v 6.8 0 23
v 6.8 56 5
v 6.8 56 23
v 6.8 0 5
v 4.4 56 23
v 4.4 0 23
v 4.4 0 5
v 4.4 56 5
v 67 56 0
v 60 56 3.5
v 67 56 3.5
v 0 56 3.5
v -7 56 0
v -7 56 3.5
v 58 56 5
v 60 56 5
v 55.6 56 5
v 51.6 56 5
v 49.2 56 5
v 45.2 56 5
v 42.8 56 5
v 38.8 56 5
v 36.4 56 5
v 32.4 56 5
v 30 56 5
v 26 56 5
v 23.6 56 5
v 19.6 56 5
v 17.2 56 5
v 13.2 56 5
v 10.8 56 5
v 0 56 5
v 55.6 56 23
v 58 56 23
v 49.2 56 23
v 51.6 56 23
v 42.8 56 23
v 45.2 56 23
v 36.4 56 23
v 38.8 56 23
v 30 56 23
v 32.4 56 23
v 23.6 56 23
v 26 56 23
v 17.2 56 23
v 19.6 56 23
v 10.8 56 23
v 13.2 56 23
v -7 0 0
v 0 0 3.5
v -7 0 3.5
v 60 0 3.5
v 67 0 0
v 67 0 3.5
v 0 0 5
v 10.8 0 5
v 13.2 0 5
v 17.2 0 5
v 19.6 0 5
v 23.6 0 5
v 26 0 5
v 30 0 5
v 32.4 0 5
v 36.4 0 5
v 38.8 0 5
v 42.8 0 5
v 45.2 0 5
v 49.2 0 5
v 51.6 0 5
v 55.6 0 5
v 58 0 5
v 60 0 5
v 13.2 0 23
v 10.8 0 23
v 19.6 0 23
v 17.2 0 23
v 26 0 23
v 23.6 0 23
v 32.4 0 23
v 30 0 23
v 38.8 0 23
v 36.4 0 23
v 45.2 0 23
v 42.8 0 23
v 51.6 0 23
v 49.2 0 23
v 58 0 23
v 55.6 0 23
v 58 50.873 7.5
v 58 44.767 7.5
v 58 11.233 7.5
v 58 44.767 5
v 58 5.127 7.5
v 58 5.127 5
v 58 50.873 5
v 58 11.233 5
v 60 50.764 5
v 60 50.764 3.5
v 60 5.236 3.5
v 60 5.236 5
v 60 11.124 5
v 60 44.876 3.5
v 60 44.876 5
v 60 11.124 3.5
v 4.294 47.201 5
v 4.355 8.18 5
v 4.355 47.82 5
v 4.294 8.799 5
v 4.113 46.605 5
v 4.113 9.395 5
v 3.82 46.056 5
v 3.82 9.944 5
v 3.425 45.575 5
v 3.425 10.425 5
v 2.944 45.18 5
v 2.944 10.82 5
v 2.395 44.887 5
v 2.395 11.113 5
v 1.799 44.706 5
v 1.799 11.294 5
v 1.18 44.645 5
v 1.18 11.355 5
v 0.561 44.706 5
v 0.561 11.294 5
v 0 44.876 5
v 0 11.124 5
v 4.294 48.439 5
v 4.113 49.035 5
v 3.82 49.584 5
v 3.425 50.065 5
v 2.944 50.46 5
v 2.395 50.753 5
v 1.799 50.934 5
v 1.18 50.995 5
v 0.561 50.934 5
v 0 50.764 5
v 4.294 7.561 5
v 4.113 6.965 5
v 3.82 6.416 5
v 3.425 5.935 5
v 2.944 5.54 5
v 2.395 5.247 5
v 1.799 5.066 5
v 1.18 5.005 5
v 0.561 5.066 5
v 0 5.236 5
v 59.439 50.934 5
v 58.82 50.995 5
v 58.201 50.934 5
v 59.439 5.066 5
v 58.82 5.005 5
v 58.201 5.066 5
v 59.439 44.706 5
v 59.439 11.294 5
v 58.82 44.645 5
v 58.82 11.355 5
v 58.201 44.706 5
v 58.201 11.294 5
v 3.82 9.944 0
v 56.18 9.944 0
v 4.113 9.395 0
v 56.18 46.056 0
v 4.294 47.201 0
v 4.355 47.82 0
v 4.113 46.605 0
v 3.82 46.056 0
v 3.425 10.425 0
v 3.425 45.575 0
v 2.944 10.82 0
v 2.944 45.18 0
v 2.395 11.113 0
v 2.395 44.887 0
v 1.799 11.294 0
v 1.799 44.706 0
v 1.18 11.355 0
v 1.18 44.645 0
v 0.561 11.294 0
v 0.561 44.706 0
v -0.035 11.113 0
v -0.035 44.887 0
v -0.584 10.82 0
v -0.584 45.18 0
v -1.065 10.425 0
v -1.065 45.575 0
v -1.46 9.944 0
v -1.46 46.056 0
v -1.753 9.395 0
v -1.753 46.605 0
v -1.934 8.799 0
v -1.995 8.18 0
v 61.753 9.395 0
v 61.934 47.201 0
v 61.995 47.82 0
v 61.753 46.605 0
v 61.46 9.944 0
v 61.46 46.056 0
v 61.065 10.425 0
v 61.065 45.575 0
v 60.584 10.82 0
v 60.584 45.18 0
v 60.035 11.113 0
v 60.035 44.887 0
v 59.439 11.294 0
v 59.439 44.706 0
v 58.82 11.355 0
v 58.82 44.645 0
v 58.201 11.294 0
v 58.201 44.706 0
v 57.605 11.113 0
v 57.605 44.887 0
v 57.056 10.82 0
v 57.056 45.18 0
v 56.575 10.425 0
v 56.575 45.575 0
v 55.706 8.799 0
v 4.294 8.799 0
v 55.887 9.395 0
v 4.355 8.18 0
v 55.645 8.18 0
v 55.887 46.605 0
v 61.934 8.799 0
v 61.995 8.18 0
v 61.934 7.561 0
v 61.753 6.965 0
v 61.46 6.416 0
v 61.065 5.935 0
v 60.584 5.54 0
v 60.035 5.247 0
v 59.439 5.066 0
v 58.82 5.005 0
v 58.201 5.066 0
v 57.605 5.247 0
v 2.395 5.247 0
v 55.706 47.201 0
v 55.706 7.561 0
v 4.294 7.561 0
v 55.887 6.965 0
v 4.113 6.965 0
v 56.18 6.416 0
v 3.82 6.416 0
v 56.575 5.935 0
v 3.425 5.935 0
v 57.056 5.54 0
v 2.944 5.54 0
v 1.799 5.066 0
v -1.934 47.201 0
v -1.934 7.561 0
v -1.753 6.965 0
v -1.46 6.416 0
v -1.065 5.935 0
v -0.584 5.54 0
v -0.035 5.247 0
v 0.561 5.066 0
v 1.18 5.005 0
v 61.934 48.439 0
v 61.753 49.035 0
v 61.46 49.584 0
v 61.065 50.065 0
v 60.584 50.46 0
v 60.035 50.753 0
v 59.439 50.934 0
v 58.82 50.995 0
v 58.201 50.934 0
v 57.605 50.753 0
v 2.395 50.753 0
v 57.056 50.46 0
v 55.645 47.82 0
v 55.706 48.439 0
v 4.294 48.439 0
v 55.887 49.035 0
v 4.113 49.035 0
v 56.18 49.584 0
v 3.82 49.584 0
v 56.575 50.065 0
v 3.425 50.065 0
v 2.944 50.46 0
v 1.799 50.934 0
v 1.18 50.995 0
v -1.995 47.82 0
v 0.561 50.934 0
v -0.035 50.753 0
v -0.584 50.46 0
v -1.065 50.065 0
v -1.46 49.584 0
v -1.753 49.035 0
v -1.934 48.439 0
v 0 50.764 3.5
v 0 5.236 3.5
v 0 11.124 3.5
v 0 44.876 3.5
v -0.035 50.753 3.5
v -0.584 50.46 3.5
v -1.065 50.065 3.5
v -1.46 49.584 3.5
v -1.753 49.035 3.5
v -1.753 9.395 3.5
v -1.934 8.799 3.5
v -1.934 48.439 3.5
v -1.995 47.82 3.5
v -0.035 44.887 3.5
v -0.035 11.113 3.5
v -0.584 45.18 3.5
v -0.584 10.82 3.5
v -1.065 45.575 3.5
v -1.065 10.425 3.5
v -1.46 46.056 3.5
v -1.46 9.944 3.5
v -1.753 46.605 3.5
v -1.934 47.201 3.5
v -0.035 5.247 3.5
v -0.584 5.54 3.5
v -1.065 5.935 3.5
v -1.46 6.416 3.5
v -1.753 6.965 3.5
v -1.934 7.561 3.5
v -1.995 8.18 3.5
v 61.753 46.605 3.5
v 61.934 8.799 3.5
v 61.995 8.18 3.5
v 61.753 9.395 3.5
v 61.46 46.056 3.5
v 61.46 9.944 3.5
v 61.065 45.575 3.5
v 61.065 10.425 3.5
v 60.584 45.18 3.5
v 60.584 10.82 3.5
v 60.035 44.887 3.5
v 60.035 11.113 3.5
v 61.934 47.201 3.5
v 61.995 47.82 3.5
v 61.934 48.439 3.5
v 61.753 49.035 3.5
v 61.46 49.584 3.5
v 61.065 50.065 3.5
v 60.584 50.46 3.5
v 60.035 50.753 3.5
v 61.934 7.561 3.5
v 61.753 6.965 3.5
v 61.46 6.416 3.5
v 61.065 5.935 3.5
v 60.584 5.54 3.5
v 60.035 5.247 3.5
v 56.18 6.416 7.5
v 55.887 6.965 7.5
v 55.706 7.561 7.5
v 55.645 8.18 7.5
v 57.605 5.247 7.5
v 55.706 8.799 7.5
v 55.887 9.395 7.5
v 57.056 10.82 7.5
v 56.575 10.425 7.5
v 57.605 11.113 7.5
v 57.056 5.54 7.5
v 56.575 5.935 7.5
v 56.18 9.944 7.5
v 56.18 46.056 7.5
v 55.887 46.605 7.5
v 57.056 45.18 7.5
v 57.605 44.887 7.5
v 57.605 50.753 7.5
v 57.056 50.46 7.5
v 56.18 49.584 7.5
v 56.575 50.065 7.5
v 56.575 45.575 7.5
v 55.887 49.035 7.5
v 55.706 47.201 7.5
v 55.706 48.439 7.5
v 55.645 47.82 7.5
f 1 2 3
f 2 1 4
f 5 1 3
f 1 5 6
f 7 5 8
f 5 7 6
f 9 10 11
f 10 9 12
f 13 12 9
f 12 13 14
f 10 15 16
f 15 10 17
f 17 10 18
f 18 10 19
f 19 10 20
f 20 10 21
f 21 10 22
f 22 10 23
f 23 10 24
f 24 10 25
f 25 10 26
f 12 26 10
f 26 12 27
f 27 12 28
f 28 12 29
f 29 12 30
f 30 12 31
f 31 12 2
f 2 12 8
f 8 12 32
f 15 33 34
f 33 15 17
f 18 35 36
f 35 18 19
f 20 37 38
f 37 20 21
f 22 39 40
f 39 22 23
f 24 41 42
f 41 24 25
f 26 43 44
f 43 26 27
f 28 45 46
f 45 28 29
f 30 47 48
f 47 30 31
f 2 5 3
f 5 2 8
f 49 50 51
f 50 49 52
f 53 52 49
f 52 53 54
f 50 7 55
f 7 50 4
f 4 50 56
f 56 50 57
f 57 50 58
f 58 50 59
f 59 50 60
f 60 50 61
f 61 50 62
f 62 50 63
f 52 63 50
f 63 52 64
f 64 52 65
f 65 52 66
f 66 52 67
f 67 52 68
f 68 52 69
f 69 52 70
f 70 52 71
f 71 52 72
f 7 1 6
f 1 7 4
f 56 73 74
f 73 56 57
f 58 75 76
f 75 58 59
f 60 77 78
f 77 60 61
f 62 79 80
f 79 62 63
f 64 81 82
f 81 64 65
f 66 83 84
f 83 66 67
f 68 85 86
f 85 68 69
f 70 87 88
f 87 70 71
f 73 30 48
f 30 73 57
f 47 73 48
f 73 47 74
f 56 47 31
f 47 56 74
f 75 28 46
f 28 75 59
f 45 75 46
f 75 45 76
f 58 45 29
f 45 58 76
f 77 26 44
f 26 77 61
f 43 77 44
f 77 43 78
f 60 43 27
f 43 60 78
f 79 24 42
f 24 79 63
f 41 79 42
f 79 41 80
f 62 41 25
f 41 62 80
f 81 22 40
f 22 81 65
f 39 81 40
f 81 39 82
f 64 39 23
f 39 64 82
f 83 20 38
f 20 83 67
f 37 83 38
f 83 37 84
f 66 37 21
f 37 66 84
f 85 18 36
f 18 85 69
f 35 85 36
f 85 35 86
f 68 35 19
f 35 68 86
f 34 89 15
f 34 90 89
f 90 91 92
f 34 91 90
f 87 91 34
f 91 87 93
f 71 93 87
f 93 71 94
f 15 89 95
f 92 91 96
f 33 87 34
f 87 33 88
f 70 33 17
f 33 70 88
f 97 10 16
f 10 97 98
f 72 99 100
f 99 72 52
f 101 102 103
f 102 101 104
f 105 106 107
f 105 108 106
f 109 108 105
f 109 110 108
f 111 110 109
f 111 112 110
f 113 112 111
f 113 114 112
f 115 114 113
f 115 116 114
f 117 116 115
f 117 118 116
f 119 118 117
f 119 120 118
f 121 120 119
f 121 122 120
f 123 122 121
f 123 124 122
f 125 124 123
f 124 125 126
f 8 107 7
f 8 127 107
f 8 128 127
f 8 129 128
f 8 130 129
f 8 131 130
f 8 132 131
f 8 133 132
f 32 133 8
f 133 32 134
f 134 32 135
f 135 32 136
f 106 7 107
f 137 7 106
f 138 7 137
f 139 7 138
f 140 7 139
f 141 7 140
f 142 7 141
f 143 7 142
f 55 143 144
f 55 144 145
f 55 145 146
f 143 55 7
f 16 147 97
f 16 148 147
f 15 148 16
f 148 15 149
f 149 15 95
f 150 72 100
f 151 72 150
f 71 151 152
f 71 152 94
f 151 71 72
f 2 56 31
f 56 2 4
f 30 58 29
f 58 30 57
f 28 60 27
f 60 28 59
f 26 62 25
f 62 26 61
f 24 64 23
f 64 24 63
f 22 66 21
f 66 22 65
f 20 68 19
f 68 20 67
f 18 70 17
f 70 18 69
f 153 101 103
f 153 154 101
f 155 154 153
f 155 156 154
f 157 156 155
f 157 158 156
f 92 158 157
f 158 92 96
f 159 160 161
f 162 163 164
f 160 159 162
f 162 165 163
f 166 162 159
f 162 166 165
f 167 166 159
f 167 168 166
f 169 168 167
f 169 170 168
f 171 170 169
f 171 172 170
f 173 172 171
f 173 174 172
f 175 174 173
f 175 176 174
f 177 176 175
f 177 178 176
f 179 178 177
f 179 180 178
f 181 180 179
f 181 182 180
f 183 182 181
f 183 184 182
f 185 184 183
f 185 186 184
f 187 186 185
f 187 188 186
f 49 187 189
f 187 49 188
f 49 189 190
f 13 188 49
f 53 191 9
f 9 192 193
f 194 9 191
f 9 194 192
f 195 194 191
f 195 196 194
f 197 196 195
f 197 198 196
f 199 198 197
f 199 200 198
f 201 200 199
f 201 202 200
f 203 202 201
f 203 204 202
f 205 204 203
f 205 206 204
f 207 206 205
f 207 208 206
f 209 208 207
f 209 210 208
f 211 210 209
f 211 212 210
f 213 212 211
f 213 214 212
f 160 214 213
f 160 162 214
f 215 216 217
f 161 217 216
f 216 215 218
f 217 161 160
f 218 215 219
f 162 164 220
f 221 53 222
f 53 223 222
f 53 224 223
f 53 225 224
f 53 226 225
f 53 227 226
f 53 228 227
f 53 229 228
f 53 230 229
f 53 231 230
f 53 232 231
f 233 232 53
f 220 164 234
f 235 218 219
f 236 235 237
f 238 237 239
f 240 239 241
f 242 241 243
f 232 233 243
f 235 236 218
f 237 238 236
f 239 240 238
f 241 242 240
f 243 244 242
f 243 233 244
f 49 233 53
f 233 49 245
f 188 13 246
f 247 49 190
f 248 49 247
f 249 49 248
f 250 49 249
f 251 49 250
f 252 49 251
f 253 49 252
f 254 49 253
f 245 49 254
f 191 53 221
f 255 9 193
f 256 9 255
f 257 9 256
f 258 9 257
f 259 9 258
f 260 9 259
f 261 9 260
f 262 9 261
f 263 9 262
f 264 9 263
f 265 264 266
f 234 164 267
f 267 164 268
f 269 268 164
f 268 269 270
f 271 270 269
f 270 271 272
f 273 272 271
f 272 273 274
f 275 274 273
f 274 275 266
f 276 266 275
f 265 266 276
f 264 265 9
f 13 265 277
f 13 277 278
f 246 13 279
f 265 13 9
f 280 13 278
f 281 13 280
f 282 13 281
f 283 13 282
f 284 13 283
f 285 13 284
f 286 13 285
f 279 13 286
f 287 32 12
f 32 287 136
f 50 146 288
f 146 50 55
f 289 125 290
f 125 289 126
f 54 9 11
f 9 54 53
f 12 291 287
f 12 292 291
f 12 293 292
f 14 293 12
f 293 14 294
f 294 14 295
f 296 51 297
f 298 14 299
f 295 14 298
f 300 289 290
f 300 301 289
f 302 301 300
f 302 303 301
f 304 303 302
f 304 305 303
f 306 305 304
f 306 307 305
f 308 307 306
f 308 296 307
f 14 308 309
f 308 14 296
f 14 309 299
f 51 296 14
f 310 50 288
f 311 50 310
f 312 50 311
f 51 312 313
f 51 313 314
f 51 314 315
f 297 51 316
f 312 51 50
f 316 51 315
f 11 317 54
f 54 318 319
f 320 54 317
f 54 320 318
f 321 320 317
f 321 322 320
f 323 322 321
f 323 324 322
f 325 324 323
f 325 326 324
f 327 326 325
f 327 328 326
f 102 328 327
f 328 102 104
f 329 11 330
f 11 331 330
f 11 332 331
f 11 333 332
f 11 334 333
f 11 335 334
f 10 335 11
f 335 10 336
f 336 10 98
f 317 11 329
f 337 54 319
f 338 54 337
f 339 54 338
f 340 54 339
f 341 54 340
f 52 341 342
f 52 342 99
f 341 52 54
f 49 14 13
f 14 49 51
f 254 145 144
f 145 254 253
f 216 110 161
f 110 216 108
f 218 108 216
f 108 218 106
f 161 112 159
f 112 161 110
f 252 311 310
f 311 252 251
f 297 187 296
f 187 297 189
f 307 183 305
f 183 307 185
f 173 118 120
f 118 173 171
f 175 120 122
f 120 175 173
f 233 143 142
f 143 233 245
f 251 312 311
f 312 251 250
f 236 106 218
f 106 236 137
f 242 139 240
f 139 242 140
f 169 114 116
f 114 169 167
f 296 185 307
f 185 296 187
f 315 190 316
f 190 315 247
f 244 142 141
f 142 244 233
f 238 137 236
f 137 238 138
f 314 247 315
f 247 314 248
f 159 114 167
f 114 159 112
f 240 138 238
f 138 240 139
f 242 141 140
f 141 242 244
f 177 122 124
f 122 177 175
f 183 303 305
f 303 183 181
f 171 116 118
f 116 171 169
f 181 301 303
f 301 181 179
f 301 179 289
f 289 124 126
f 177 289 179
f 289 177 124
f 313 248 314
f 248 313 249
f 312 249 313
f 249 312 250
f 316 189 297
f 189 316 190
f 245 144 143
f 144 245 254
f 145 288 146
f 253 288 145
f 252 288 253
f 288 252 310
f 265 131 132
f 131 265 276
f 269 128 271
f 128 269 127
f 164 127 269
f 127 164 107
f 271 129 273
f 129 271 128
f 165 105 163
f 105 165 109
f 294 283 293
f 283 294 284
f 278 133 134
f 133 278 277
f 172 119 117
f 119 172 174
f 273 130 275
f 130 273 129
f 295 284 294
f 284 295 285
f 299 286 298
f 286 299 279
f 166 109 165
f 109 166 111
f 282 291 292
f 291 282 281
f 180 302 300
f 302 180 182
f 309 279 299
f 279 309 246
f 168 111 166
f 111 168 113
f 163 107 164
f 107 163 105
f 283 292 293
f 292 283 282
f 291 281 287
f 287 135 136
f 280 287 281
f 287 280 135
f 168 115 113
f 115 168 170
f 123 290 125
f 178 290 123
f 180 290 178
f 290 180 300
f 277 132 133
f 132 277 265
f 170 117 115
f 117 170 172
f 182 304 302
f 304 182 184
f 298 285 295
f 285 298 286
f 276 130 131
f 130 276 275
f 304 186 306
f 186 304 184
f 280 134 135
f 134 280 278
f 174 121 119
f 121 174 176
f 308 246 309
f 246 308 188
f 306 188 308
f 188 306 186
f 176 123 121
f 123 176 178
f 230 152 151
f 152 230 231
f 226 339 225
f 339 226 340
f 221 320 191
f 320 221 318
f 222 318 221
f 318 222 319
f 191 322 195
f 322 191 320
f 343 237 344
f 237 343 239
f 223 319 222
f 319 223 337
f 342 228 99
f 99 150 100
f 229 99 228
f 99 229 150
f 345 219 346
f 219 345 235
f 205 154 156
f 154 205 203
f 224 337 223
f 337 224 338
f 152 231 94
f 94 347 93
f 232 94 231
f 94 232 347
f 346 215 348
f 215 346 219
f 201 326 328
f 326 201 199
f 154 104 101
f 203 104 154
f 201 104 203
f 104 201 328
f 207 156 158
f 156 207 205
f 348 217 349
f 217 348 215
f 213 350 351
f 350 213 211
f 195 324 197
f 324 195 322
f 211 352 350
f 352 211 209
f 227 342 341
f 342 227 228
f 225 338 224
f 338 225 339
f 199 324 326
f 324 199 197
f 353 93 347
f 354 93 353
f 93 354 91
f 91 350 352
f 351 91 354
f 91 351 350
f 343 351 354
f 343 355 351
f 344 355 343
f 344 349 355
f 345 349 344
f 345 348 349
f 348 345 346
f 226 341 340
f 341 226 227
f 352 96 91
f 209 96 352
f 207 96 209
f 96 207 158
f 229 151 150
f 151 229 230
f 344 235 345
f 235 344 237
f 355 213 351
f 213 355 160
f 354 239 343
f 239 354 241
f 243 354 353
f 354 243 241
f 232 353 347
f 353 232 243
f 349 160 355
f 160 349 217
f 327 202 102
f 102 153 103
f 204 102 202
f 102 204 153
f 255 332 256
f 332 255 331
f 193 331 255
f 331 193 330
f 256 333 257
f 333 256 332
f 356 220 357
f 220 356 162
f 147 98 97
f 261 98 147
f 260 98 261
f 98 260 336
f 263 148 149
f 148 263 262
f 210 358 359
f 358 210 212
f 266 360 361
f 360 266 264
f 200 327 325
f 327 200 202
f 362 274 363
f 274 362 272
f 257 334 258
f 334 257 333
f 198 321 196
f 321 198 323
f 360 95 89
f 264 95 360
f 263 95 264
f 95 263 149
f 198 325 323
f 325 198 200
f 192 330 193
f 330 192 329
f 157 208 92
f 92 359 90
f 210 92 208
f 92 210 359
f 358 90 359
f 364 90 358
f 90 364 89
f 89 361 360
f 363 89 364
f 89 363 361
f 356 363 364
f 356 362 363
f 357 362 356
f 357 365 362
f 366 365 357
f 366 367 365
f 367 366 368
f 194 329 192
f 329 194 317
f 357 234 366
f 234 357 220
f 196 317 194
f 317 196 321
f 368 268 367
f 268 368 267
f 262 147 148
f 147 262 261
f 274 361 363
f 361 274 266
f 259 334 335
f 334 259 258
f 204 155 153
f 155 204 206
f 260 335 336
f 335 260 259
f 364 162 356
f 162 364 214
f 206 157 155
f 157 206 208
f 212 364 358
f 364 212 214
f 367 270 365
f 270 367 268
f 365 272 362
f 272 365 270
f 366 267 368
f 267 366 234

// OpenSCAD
$fn = 32;

// ----------------------------------------------------------------------
// Finned heat sink: 60 x 56 mm base, 18 mm fins
// ----------------------------------------------------------------------

// --- parameters (mm) ---
base_w = 60;              // base width
base_d = 56;              // base depth
base_t = 5;               // base thickness
fin_h = 18;               // fin height above the base
holes_d = 6.35;           // fixing holes
hole_x = 28.82;           // hole offset in x
hole_y = 19.82;           // hole offset in y
fin_t = 2.4;              // fin thickness
fin_pitch = 6.4;          // fin pitch
fin_count = 9;            // number of fins
fin_x0 = 4.4;             // first fin offset
flange_w = 74;            // flange plate width
flange_t = 3;             // flange plate thickness

difference() {
  union() {
    cube([base_w, base_d, base_t]);
    for (i = [0 : fin_count - 1]) {
      translate([fin_x0 + i * fin_pitch, 0, base_t - 0.5]) cube([fin_t, base_d, fin_h + 0.5]);
    }
    /* mounting flange, a wider plate sharing the base bottom */
    translate([(base_w - flange_w) / 2, 0, 0]) cube([flange_w, base_d, flange_t + 0.5]);
  }
  /* fixing holes through the base, 2.5 mm clear on both sides */
  for (hx = [-28.82, 28.82]) {
    for (hy = [-19.82, 19.82]) {
      translate([base_w / 2 + hx, base_d / 2 + hy, -2.5]) cylinder(h = base_t + 5, d = holes_d);
    }
  }
}
